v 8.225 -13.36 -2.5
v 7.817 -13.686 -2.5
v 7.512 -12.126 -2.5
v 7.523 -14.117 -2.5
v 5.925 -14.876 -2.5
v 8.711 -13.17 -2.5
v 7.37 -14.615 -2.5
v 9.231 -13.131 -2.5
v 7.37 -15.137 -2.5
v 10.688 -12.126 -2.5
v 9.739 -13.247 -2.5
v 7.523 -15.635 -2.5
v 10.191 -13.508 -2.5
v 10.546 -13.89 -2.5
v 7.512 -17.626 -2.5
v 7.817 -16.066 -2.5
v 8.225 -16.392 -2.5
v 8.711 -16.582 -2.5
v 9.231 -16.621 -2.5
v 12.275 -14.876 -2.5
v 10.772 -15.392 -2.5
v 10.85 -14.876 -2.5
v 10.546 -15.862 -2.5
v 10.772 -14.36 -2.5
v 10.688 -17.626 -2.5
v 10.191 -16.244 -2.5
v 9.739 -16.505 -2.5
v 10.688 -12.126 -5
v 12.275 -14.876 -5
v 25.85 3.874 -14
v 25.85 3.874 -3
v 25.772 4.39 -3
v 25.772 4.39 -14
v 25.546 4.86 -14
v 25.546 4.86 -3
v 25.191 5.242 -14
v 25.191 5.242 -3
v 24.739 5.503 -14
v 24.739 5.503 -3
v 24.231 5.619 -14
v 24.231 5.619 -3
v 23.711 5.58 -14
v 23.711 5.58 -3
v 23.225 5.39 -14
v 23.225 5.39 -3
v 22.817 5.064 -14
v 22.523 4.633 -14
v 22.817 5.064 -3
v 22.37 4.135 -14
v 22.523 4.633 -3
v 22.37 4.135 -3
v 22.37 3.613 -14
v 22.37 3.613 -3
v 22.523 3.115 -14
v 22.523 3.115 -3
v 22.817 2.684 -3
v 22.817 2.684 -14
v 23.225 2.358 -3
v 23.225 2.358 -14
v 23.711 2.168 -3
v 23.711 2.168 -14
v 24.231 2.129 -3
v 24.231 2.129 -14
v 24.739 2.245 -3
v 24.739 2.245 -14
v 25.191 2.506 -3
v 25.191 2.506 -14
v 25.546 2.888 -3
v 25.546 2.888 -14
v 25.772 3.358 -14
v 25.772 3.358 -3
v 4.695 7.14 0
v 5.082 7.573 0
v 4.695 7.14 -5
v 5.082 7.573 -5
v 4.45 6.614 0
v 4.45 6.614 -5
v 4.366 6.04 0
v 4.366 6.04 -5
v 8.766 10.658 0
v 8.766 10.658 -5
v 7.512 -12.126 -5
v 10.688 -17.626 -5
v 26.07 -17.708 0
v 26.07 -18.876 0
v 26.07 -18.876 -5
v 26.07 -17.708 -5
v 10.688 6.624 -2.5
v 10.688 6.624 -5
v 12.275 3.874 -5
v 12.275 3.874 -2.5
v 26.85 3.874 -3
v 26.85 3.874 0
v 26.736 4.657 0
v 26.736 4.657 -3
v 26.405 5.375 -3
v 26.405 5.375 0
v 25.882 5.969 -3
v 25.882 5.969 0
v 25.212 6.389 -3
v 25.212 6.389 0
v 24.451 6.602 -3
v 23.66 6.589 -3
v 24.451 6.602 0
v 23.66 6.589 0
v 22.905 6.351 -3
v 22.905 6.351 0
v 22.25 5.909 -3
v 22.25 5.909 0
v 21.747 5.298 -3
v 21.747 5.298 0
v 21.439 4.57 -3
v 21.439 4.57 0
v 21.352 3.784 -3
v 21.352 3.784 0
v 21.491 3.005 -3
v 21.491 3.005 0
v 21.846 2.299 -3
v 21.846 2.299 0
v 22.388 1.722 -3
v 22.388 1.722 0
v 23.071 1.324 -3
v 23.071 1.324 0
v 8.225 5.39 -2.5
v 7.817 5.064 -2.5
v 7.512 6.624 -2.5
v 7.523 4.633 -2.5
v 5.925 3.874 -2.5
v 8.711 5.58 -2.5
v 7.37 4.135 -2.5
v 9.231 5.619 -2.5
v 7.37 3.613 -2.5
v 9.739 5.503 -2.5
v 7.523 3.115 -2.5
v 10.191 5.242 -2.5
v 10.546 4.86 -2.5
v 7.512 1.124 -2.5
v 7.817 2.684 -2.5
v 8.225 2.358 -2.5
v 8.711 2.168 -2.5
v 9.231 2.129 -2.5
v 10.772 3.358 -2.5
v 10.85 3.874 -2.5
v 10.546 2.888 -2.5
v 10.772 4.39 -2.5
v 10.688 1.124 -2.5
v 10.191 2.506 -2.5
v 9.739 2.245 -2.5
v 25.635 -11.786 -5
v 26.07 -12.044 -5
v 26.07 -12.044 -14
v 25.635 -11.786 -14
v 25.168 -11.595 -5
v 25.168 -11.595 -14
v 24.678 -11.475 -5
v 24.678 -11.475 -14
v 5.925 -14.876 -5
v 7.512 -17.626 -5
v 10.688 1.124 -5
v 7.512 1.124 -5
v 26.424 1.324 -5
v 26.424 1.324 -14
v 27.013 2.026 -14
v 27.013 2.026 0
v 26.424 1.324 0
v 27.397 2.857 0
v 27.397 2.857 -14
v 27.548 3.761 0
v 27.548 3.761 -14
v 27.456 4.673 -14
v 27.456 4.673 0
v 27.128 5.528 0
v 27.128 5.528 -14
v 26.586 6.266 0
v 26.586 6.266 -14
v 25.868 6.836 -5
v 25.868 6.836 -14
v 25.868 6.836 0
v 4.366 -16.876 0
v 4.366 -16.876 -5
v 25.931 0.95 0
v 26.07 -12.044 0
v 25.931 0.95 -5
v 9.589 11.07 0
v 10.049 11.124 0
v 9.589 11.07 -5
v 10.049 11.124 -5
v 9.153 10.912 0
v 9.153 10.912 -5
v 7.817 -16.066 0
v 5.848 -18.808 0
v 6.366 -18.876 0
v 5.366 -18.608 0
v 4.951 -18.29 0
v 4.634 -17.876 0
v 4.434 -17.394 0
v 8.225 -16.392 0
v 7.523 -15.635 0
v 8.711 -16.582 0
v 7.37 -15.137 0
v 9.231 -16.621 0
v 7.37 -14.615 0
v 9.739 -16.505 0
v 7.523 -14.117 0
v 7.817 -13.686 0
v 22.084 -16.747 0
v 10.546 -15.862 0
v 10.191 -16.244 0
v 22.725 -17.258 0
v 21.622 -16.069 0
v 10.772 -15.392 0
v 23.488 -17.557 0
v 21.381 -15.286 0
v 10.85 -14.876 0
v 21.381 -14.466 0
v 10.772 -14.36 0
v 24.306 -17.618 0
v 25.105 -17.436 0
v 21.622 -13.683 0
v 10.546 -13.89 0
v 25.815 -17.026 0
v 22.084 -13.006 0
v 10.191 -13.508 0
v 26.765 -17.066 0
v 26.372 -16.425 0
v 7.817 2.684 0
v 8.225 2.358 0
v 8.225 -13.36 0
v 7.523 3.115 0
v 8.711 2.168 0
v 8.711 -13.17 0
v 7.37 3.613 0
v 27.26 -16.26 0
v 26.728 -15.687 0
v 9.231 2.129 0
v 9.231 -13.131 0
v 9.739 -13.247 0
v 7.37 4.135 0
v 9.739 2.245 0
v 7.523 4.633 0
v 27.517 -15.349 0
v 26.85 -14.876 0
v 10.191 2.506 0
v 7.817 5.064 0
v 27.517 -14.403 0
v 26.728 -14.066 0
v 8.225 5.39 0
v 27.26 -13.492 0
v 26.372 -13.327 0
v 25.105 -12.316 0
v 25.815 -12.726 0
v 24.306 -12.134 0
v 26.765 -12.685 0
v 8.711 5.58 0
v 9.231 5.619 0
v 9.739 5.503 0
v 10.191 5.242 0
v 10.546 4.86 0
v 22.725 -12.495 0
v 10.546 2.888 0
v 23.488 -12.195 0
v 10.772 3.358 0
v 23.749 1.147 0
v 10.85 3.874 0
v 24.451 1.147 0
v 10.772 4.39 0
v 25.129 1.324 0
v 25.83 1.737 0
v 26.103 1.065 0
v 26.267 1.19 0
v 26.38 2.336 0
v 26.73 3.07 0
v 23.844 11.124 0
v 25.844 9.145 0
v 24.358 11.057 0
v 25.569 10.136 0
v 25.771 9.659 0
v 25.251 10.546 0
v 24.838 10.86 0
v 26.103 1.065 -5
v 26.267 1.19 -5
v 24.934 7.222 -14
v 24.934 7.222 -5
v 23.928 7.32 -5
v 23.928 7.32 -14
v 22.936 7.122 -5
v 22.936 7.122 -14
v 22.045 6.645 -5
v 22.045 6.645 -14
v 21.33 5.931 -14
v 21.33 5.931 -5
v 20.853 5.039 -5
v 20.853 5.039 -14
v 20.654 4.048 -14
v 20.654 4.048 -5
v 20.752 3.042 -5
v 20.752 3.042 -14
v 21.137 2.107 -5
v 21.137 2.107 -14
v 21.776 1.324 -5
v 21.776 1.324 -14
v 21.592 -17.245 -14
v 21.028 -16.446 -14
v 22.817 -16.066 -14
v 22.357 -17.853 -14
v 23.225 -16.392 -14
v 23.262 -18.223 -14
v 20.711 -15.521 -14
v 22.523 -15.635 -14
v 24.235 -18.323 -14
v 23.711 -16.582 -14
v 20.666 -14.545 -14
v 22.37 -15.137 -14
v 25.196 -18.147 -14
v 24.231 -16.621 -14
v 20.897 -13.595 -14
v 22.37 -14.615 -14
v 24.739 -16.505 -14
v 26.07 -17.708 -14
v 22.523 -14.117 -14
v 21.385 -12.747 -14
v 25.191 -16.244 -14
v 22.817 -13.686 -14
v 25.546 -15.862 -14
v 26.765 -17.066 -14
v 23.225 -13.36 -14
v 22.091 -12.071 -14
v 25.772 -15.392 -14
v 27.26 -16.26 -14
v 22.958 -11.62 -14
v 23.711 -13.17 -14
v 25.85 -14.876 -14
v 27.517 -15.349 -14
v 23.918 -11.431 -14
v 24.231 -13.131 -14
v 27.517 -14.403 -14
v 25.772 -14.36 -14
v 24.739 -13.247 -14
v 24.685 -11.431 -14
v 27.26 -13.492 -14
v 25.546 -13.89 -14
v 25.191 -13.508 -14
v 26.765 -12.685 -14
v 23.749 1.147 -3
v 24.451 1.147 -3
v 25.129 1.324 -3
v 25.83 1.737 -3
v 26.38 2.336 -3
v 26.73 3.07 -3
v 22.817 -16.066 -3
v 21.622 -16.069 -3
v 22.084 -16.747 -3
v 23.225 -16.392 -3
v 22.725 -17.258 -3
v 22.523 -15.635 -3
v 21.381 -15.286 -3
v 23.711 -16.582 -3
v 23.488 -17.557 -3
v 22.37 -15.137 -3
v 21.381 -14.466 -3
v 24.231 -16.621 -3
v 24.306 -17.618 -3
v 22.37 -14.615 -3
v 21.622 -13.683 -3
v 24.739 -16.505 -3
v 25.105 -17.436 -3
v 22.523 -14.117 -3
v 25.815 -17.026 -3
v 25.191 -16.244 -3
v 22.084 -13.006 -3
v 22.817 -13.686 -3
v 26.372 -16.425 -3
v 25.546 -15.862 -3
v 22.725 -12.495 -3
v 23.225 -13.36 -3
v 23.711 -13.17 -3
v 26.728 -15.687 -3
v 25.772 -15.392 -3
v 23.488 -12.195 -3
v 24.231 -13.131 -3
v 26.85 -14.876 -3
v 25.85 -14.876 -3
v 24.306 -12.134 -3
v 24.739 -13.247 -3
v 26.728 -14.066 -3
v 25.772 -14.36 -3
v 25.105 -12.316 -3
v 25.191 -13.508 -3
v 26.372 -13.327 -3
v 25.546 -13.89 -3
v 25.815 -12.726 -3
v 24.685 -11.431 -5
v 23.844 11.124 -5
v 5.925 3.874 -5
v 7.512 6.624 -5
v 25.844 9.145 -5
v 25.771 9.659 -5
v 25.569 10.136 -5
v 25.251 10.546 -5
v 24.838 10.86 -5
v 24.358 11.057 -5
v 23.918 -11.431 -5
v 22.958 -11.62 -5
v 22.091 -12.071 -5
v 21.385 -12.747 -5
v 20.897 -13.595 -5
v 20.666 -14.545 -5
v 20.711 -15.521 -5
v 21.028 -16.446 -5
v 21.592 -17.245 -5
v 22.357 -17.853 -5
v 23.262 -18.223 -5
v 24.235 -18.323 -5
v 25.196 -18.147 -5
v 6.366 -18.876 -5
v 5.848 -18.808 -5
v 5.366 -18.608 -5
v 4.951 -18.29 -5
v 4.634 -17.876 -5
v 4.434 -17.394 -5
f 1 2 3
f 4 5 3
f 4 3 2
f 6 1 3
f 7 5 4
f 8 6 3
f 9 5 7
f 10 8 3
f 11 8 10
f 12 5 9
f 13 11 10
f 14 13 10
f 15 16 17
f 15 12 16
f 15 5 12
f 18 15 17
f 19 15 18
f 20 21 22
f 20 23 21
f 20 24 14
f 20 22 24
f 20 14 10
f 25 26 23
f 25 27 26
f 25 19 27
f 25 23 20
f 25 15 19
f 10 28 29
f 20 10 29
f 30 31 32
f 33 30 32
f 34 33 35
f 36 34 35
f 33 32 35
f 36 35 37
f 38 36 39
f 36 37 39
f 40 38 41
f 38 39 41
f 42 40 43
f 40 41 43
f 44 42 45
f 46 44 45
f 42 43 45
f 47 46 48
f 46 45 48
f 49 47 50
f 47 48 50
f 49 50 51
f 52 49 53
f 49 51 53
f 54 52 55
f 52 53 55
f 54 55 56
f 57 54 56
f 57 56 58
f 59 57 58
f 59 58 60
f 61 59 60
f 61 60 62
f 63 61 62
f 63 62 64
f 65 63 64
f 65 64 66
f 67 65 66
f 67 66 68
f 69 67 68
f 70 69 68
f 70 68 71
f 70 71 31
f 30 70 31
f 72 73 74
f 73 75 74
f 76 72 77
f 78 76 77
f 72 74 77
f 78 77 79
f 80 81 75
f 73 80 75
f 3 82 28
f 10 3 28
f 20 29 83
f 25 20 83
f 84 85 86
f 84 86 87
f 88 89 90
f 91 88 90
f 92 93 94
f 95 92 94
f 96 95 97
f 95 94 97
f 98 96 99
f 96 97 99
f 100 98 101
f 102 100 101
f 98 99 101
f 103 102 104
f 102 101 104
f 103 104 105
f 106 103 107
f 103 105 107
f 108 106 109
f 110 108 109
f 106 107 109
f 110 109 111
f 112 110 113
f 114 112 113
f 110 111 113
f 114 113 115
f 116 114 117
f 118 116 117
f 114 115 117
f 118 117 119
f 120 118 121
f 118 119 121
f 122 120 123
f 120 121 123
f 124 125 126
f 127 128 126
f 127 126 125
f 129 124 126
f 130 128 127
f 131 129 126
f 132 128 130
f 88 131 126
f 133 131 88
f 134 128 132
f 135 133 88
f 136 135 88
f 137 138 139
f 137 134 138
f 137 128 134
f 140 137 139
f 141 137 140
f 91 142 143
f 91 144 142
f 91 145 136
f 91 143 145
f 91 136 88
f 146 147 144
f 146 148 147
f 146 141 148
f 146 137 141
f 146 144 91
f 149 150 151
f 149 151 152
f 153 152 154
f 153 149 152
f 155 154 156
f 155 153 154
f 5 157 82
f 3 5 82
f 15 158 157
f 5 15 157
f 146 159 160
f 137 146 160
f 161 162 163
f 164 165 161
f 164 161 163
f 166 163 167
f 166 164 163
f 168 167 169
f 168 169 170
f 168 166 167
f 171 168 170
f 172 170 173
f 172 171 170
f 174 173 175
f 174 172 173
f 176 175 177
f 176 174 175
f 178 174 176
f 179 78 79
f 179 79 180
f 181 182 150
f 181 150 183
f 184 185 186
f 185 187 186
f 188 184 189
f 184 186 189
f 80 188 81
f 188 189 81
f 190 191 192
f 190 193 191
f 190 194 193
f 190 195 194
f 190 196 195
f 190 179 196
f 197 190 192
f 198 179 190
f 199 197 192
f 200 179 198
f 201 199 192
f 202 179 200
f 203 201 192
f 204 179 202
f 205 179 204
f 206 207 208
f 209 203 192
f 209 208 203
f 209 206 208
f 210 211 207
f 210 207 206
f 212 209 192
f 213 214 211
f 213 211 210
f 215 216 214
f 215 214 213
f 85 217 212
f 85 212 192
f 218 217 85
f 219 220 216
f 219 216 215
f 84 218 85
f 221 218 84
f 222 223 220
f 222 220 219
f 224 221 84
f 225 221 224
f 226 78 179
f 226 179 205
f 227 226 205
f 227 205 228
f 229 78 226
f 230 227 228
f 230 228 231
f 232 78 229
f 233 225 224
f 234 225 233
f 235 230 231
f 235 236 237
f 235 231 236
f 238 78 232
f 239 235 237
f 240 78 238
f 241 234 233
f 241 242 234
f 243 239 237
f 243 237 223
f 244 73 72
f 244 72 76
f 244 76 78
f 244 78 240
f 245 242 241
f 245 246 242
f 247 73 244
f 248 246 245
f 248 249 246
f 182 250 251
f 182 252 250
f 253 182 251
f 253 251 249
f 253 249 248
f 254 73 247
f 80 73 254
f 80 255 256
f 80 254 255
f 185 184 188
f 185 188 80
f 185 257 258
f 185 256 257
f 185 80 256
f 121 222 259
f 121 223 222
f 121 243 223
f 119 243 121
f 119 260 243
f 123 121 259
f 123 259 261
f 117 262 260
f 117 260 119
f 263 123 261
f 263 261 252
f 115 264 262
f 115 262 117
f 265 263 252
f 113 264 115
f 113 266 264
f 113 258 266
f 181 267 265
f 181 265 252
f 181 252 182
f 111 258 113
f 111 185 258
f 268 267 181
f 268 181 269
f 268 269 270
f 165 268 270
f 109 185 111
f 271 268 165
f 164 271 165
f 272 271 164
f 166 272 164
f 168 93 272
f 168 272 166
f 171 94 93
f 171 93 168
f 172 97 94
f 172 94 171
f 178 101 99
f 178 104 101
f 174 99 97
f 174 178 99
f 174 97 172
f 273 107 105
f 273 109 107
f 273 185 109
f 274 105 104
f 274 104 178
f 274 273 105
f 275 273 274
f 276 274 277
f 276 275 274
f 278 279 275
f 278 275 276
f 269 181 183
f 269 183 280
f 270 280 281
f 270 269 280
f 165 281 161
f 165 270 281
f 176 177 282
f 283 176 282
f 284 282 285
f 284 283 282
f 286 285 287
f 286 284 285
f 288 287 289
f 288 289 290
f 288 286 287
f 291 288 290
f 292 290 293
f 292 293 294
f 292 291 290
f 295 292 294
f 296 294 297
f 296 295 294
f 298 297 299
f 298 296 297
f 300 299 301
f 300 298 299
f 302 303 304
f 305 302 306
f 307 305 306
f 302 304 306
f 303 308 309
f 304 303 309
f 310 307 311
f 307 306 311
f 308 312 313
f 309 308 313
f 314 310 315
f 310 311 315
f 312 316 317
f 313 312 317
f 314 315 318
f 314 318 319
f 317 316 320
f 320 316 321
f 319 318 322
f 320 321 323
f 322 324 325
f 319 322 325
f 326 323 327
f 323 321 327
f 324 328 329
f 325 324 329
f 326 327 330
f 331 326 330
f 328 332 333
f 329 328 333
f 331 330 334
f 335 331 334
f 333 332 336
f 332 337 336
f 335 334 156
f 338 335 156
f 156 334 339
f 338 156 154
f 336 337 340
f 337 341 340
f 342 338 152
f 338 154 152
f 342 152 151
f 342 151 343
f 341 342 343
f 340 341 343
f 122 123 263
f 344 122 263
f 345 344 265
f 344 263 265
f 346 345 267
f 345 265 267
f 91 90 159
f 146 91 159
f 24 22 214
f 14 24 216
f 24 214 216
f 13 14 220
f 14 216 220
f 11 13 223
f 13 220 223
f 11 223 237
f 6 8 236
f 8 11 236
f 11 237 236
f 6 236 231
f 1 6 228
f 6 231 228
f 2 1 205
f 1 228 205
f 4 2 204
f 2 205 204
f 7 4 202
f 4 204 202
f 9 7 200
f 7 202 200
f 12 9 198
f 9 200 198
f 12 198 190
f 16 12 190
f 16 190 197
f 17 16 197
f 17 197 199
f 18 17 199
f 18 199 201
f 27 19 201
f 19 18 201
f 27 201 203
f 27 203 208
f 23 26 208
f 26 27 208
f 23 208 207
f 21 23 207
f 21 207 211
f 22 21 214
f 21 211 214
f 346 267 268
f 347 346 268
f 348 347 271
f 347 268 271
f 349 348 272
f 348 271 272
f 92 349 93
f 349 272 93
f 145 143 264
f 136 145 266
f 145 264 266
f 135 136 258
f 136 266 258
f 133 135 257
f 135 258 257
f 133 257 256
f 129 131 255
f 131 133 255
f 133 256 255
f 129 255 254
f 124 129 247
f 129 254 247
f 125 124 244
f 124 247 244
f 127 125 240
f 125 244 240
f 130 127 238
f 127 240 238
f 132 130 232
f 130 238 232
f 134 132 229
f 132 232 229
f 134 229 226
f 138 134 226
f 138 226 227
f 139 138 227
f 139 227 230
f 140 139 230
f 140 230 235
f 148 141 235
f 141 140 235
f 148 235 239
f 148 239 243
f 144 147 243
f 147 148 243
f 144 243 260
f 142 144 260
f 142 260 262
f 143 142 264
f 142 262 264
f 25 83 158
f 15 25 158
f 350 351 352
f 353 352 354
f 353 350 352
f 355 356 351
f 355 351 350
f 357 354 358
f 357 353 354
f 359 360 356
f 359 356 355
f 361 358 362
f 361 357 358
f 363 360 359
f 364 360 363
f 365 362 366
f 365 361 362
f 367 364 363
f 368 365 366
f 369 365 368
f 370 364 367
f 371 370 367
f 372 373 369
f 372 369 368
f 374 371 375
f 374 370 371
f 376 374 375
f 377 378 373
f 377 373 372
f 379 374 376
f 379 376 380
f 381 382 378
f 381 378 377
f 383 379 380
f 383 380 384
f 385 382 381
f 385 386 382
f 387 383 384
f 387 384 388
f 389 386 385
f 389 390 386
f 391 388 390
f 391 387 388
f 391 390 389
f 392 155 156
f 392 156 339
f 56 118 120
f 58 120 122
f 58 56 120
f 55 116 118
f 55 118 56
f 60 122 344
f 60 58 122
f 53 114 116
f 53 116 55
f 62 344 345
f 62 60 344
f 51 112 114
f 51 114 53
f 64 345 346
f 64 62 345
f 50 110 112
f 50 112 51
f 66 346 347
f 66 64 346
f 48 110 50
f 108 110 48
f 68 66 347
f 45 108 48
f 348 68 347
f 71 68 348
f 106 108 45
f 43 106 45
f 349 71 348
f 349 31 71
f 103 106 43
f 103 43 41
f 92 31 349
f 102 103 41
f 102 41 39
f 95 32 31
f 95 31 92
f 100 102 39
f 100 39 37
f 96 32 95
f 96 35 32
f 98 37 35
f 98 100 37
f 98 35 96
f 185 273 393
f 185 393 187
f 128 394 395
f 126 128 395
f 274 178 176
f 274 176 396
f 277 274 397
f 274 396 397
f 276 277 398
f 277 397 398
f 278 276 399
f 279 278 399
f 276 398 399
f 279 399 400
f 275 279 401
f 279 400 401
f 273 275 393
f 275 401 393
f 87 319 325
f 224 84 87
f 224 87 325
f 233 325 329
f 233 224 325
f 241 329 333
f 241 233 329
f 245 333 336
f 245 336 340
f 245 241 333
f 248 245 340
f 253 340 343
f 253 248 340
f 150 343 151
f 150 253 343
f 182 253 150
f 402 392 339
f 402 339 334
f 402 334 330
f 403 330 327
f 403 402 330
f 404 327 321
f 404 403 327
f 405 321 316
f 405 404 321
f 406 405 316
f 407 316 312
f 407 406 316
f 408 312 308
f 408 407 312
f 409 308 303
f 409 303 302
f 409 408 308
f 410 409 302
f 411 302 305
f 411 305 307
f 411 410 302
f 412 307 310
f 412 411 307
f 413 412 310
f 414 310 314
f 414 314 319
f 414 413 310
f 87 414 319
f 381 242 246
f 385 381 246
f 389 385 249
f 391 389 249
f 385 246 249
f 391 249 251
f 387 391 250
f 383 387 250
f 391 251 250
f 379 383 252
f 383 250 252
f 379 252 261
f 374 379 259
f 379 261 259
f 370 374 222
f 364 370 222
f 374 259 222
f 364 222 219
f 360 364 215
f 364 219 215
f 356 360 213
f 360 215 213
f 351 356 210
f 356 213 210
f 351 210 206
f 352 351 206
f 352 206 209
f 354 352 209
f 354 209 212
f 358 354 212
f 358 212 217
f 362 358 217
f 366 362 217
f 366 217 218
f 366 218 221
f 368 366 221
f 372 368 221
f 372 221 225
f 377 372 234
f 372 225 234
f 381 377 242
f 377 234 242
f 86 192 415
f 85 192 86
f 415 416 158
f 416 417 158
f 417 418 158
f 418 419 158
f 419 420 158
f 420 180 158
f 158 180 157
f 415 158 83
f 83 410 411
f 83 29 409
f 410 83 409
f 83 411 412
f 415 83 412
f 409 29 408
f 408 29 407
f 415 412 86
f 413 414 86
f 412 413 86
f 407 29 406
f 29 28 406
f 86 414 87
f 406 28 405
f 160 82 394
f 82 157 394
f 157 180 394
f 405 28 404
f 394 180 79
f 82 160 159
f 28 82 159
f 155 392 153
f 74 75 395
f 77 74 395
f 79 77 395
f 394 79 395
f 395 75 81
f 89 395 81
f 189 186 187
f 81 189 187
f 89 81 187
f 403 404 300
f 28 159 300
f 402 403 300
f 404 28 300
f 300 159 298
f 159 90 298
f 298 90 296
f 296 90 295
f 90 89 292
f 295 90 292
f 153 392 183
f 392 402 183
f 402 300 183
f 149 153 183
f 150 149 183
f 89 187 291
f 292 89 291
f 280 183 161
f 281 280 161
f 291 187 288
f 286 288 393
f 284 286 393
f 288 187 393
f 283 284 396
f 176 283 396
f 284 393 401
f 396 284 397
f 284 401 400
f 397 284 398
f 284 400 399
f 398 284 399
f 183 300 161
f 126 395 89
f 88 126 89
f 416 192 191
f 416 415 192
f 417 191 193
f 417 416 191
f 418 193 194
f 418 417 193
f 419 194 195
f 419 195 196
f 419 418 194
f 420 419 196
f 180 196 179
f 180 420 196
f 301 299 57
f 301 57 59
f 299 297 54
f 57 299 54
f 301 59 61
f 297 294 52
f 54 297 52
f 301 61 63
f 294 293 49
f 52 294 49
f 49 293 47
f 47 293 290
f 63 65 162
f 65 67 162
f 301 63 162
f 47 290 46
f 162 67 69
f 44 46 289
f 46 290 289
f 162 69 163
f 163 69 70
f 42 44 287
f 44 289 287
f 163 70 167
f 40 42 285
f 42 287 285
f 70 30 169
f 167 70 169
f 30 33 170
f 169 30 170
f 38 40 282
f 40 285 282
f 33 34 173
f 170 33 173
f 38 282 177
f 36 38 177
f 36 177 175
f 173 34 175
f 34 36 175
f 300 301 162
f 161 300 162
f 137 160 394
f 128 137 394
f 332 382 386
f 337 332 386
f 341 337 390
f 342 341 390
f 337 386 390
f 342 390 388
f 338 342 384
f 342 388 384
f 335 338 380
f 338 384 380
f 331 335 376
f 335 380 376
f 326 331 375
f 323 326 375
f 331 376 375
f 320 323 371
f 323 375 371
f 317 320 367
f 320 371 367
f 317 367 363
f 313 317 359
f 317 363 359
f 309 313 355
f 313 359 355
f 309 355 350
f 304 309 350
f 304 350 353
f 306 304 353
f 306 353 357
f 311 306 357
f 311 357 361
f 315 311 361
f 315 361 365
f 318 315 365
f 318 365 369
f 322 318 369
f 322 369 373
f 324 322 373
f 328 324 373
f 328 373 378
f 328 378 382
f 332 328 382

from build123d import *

# Parameters (mm, degrees)
F0_R     = 1.75
F1_DEPTH = 14
F2_DEPTH = 5
F3_R     = 2
F4_R     = 2.75
F5_DEPTH = 3
F6_R     = 1.75
F7_DEPTH = 2.5


with BuildPart() as f1:
    # F0 (on Top) → F1 (new body)
    with BuildSketch(Plane.XY):
        with BuildLine():
            Line((21.7761647301, 1.3240322888), (26.4237447456, 1.3240322888))
            ThreePointArc((26.4237447456, 1.3240322888), (27.5325816725, 4.2198246066), (25.8684580679, 6.8362773785))
            ThreePointArc((25.8684580679, 6.8362773785), (21.3298830229, 5.9305348281), (21.7761647301, 1.3240322888))
        make_face()
        with Locations((24.0999547378, 3.8740322888)):
            Circle(F0_R, mode=Mode.SUBTRACT)
    extrude(amount=-F1_DEPTH)



with BuildPart() as f1b:
    # F0 (on Top) → F1, piece 2 (new body)
    with BuildSketch(Plane.XY):
        with BuildLine():
            Line((26.0698554789, -17.7082796768), (26.0698554789, -12.0436557456))
            ThreePointArc((26.0698554789, -12.0436557456), (25.4051734809, -11.6823954116), (24.6777322905, -11.4746924945))
            Line((24.6777322905, -11.4746924945), (24.6851897334, -11.430791835))
            Line((24.6851897334, -11.430791835), (23.9175727699, -11.430791835))
            ThreePointArc((23.9175727699, -11.430791835), (20.8364414099, -15.9948871713), (26.0698554789, -17.7082796768))
        make_face()
        with Locations((24.0999547378, -14.8759677112)):
            Circle(F0_R, mode=Mode.SUBTRACT)
        with BuildLine():
            ThreePointArc((26.0698554789, -17.7082796768), (27.5499547378, -14.8759677112), (26.0698554789, -12.0436557456))
            Line((26.0698554789, -12.0436557456), (26.0698554789, -17.7082796768))
        make_face()
    extrude(amount=-F1_DEPTH)


with BuildPart() as f1_1:
    add(f1.part)

    add(f1b.part)  # F2 merges F1b
    # F0 (on Top) → F2 (join)
    with BuildSketch(Plane.XY):
        with BuildLine():
            Line((26.0698554789, -12.0436557456), (25.9312466019, 0.9501871991))
            ThreePointArc((25.9312466019, 0.9501871991), (26.1858877133, 1.1260541917), (26.4237447456, 1.3240322888))
            Line((26.4237447456, 1.3240322888), (21.7761647301, 1.3240322888))
            ThreePointArc((21.7761647301, 1.3240322888), (21.3298830229, 5.9305348281), (25.8684580679, 6.8362773785))
            Line((25.8684580679, 6.8362773785), (25.8227194135, 11.1240322888))
            Line((25.8227194135, 11.1240322888), (9.3227194135, 11.1240322888))
            Line((9.3227194135, 11.1240322888), (4.3655936032, 6.9737100091))
            Line((4.3655936032, 6.9737100091), (4.3655936032, -18.8759677112))
            Line((4.3655936032, -18.8759677112), (9.8819473522, -18.8759677112))
            Line((9.8819473522, -18.8759677112), (9.9476614486, -18.8759677112))
            Line((9.9476614486, -18.8759677112), (23.5200859606, -18.8759677112))
            Line((23.5200859606, -18.8759677112), (26.0698554789, -18.8759677112))
            Line((26.0698554789, -18.8759677112), (26.0698554789, -17.7082796768))
            ThreePointArc((26.0698554789, -17.7082796768), (20.8364414099, -15.9948871713), (23.9175727699, -11.430791835))
            Line((23.9175727699, -11.430791835), (24.6851897334, -11.430791835))
            Line((24.6851897334, -11.430791835), (24.6777322905, -11.4746924945))
            ThreePointArc((24.6777322905, -11.4746924945), (25.4051734809, -11.6823954116), (26.0698554789, -12.0436557456))
        make_face()
        with Locations((9.0999547378, -14.8759677112)):
            Circle(F0_R, mode=Mode.SUBTRACT)
        with Locations((9.0999547378, 3.8740322888)):
            Circle(F0_R, mode=Mode.SUBTRACT)
    extrude(amount=-F2_DEPTH)

    # F3
    f3_edges = [f1_1.edges().sort_by_distance(p)[0] for p in [
        (9.322719, 11.124032, -2.5),
        (4.365594, 6.97371, -2.5),
        (4.365594, -18.875968, -2.5),
        (25.822719, 11.124032, -2.5),
    ]]
    fillet(f3_edges, radius=F3_R)

    # F4 (on face) → F5 (cut)
    with BuildSketch(Plane.XY):
        with BuildLine():
            ThreePointArc((25.1289665719, 1.3240322888), (26.379519606, 2.3359536637), (26.8500410169, 3.8742895704))
            ThreePointArc((26.8500410169, 3.8742895704), (22.5617051102, 6.1537681595), (23.0711154619, 1.3240322888))
            Line((23.0711154619, 1.3240322888), (25.1289665719, 1.3240322888))
        make_face()
        with BuildLine():
            Line((25.1289665719, 1.3240322888), (23.0711154619, 1.3240322888))
            ThreePointArc((23.0711154619, 1.3240322888), (24.1000410169, 1.1242895704), (25.1289665719, 1.3240322888))
        make_face()
        with Locations((24.1000410169, -14.8761207238)):
            Circle(F4_R)
    extrude(amount=-F5_DEPTH, mode=Mode.SUBTRACT)

    # F6 (on face) → F7 (cut)
    with BuildSketch(Plane(origin=(0, 0, -5), x_dir=(1, 0, 0), z_dir=(0, 0, -1))):
        Polygon((10.6876679781, -1.1240322888), (7.5122414976, -1.1240322888), (5.9245282573, -3.8740322888), (7.5122414976, -6.6240322888), (10.6876679781, -6.6240322888), (12.2753812184, -3.8740322888), align=None)
        with Locations((9.0999547378, -3.8740322888)):
            Circle(F6_R, mode=Mode.SUBTRACT)
        Polygon((10.6876679781, 17.6259677112), (7.5122414976, 17.6259677112), (5.9245282573, 14.8759677112), (7.5122414976, 12.1259677112), (10.6876679781, 12.1259677112), (12.2753812184, 14.8759677112), align=None)
        with Locations((9.0999547378, 14.8759677112)):
            Circle(F6_R, mode=Mode.SUBTRACT)
    extrude(amount=-F7_DEPTH, mode=Mode.SUBTRACT)


solid = f1_1.part
